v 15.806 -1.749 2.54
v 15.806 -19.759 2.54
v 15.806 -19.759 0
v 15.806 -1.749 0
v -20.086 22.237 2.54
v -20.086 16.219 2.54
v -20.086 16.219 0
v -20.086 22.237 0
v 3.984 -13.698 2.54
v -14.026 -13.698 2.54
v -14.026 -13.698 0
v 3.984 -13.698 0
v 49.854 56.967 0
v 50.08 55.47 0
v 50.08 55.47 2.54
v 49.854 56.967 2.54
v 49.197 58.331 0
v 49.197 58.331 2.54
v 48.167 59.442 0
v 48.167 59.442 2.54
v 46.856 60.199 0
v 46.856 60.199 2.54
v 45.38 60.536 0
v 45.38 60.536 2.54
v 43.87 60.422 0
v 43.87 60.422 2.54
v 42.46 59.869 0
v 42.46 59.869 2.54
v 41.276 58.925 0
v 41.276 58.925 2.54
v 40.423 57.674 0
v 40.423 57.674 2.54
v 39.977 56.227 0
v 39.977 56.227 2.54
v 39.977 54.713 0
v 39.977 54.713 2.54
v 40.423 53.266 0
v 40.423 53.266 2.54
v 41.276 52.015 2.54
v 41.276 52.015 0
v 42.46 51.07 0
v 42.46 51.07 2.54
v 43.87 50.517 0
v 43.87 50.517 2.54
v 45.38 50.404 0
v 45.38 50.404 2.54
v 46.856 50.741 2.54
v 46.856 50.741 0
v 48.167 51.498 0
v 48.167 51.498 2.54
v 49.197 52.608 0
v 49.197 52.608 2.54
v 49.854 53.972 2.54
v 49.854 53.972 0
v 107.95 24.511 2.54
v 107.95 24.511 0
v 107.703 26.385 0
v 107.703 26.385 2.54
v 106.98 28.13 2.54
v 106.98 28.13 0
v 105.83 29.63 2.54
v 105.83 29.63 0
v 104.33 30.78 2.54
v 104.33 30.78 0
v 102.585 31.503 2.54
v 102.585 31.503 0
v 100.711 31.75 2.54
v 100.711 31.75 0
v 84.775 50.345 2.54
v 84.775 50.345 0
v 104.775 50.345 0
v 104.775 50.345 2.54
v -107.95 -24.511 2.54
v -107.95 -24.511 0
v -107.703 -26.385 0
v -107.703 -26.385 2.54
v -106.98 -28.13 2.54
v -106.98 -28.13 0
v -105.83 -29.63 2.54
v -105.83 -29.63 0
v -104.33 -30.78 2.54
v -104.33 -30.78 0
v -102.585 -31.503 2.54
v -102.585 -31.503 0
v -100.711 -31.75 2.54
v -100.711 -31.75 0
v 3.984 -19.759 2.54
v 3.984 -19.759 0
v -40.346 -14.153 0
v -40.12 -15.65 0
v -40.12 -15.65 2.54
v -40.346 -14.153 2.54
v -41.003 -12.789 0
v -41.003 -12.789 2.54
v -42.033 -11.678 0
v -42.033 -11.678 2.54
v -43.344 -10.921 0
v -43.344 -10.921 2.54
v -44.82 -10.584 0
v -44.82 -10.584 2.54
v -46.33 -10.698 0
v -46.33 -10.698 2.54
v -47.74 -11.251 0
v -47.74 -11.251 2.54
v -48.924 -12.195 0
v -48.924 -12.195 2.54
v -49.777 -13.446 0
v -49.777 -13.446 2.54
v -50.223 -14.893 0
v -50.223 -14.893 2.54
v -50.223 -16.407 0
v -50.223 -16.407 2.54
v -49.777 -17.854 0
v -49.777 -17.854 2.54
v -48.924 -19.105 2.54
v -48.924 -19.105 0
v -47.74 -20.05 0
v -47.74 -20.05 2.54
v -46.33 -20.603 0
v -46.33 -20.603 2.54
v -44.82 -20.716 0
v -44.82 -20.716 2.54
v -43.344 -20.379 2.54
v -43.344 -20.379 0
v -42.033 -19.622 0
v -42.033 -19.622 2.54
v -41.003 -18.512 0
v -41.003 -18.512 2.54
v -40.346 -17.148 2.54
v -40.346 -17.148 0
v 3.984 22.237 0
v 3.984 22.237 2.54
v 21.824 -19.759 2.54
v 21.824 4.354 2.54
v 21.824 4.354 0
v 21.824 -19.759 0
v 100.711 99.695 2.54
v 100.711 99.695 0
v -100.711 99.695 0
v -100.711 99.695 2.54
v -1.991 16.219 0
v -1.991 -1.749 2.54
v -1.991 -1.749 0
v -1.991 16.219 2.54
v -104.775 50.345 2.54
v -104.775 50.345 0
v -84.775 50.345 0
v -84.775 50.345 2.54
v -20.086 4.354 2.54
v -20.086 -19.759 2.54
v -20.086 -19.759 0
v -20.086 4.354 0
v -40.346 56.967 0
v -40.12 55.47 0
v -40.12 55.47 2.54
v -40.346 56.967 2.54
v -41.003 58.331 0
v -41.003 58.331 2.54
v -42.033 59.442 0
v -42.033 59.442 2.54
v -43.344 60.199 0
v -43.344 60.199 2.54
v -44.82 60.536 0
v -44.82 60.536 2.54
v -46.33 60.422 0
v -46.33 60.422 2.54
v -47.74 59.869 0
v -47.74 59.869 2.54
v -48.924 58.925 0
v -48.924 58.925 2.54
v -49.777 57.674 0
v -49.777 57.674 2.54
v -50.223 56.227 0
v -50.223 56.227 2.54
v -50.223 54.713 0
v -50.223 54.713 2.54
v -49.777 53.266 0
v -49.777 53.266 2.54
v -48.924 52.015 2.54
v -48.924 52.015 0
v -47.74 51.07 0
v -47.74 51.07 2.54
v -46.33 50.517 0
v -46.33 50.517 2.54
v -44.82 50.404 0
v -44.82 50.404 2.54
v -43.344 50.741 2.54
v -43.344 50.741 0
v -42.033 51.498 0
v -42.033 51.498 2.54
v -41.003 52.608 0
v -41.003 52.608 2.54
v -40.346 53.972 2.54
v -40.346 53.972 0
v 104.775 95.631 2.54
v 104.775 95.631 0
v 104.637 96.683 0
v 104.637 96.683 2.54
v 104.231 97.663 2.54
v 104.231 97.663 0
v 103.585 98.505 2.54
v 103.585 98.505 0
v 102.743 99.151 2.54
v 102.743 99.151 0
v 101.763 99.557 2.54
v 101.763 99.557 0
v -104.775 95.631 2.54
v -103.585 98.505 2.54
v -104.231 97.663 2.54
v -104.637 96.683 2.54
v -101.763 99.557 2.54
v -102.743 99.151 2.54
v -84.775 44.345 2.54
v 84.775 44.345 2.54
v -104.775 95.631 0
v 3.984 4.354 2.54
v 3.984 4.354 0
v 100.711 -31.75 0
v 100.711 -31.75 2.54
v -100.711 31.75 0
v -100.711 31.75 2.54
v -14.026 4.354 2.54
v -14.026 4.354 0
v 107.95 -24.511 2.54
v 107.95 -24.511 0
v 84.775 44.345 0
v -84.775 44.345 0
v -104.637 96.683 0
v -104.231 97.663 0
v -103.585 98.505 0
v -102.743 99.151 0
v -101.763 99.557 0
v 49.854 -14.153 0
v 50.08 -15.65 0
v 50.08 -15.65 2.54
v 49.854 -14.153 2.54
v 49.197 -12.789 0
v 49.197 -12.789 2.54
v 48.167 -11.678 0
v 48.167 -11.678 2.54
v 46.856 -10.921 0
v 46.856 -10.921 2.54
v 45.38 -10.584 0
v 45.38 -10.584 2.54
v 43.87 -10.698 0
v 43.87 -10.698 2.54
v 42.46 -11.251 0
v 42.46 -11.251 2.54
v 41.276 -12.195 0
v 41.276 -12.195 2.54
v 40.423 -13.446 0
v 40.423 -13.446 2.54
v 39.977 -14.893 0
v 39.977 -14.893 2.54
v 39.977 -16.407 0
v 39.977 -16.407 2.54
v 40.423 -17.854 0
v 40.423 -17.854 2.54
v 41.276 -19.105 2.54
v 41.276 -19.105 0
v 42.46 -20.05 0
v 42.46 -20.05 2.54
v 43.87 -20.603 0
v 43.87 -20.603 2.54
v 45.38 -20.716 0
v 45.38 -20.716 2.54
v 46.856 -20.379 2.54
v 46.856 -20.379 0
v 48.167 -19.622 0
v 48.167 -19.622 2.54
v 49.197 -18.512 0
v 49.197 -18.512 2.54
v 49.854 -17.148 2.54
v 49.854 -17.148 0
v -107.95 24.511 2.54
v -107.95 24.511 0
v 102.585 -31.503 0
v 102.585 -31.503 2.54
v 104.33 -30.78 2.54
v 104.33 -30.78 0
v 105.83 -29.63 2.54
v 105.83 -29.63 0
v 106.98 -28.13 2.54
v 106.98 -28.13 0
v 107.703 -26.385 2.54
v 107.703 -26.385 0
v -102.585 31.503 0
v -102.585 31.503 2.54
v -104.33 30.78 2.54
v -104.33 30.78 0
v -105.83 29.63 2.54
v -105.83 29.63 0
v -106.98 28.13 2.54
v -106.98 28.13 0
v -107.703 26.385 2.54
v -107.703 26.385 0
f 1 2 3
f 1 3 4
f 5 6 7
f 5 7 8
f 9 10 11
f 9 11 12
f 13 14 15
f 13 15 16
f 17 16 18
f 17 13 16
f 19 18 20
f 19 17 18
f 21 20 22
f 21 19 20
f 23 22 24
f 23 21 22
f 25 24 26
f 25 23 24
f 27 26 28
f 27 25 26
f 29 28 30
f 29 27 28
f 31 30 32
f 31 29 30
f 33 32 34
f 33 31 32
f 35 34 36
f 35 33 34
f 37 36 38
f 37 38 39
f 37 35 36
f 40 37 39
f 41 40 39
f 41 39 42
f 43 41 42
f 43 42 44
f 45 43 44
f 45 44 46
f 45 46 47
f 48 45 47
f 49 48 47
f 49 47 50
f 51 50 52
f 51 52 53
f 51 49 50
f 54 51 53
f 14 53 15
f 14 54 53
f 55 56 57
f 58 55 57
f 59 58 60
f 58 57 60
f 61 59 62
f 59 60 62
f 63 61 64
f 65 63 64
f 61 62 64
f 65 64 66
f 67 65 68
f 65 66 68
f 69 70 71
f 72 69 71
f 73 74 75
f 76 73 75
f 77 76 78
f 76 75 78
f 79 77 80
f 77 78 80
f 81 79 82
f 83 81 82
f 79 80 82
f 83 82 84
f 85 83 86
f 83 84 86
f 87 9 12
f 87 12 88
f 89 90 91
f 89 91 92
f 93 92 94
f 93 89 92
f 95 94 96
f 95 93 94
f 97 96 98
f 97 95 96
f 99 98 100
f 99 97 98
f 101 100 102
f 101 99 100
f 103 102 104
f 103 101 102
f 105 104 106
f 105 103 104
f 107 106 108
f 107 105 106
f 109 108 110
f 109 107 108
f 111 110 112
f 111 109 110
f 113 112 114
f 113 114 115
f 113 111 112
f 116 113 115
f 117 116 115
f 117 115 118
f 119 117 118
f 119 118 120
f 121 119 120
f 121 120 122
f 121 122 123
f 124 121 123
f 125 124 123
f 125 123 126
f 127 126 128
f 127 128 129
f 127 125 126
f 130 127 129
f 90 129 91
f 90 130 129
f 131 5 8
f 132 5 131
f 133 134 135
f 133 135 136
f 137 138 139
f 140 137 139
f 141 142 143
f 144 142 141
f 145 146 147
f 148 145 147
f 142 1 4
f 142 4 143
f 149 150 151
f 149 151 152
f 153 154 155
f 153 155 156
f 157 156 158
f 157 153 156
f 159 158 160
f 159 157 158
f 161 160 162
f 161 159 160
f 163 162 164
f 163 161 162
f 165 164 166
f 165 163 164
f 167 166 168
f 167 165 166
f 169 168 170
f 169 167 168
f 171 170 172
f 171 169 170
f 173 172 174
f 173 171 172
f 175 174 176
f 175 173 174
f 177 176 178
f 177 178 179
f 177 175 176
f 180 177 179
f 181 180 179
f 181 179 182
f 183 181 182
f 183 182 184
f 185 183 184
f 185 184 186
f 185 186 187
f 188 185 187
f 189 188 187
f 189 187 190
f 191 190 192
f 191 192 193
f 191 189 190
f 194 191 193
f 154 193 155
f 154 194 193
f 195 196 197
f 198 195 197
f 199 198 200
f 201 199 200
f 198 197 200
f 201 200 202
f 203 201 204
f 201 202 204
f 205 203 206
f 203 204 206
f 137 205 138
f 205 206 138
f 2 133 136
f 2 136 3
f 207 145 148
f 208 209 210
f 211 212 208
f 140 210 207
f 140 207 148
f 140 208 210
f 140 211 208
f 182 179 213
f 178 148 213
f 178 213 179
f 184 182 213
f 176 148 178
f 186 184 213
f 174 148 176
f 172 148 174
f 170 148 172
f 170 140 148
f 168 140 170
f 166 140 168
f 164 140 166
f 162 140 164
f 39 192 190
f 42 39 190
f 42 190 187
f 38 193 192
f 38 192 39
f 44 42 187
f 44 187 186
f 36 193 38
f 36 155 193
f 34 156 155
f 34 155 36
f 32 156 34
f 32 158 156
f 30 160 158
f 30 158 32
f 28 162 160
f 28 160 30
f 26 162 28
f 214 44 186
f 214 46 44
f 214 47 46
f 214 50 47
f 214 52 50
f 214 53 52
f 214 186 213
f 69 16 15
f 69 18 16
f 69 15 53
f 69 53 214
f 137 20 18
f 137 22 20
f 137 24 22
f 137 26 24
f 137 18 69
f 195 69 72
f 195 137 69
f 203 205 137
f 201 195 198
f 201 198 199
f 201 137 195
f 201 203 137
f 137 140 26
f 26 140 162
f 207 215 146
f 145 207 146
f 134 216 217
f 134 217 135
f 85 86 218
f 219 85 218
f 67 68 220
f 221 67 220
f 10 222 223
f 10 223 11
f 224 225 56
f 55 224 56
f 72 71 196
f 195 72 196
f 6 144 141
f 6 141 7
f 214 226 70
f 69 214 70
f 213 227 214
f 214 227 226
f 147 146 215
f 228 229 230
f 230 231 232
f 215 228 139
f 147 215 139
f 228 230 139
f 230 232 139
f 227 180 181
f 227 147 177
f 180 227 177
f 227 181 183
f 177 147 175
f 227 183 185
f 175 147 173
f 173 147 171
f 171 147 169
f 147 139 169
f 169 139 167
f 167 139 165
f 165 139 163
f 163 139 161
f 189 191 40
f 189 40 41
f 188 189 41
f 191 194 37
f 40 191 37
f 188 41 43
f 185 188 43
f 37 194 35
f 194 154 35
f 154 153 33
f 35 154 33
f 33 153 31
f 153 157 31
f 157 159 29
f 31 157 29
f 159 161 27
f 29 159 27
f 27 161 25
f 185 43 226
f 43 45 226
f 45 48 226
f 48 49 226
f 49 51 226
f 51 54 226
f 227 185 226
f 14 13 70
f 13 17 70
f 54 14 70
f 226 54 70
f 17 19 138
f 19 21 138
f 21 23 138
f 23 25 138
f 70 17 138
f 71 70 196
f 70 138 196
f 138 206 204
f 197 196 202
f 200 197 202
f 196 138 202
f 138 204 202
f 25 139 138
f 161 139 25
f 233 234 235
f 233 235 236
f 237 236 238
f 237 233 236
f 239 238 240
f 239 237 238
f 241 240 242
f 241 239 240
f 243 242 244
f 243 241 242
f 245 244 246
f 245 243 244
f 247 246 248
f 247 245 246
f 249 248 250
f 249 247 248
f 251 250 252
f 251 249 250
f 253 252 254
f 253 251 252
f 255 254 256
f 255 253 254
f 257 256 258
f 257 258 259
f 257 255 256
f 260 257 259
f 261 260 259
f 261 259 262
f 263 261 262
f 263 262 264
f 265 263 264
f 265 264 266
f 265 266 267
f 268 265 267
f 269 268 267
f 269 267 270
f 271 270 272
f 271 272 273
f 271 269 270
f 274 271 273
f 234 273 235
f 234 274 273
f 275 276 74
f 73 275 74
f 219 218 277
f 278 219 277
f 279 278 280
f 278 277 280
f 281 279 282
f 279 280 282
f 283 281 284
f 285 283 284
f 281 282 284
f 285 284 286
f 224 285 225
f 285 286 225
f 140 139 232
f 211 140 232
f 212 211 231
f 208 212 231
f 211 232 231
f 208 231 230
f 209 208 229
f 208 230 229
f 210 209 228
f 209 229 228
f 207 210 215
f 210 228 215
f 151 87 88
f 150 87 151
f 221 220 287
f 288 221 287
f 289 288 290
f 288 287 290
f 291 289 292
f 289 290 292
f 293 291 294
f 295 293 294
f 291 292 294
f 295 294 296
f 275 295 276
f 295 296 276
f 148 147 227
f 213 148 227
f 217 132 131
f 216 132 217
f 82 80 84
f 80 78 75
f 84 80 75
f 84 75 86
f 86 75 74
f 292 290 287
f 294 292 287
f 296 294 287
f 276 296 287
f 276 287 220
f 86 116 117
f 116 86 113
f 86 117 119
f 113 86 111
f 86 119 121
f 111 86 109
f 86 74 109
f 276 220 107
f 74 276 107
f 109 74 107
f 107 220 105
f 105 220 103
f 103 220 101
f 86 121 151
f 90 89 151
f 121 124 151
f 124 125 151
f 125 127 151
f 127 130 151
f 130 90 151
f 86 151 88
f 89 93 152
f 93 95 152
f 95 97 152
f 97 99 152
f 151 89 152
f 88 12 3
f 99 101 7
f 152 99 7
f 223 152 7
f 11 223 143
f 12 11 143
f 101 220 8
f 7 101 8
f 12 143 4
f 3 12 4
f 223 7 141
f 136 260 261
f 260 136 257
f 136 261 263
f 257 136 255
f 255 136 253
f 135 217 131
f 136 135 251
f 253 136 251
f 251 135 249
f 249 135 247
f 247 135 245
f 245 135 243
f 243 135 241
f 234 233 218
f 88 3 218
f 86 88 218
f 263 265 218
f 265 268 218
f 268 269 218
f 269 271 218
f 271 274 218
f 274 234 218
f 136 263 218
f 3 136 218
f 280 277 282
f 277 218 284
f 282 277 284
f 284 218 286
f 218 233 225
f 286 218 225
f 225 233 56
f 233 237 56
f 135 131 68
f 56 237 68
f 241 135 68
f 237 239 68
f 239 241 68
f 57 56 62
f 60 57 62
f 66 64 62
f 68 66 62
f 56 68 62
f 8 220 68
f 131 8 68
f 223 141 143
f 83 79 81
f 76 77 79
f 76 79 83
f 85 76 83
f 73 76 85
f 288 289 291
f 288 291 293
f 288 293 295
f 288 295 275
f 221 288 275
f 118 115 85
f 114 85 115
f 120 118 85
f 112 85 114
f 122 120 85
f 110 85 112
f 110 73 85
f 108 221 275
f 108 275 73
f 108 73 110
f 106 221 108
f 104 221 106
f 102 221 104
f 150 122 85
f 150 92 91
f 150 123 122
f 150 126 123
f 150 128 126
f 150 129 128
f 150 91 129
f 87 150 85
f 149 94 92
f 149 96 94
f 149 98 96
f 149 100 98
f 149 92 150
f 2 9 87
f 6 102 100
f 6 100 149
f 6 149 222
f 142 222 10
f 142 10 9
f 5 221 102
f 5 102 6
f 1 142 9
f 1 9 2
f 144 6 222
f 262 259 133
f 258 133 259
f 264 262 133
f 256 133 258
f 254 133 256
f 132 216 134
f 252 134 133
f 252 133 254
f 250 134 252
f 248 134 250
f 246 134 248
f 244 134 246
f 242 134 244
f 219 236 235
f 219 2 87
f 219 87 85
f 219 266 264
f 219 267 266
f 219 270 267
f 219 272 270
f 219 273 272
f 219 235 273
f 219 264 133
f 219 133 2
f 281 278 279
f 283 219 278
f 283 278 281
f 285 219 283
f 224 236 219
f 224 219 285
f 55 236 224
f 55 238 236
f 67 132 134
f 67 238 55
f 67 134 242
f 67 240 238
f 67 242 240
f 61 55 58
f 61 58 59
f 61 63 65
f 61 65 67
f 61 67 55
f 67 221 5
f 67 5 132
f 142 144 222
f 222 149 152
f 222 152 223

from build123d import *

# Parameters (mm, degrees)
SKETCH1_R             = 5.08
BOSS_EXTRUDE1_DEPTH   = 2.54
BOSS_EXTRUDE1_2_DEPTH = 2.54
CUT_EXTRUDE1_DEPTH    = 147.965122138


with BuildPart() as part:
    # Sketch1 → Boss-Extrude1 (new body)
    with BuildSketch(Plane.XY):
        with BuildLine():
            Line((-52.6295, -31.75), (-37.7705, -31.75))
            Line((-37.7705, -31.75), (37.5705, -31.75))
            Line((37.5705, -31.75), (52.4295, -31.75))
            Line((52.4295, -31.75), (100.711, -31.75))
            ThreePointArc((100.711, -31.75), (105.829745989, -29.629745989), (107.95, -24.511))
            Line((107.95, -24.511), (107.95, 24.511))
            ThreePointArc((107.95, 24.511), (105.829745989, 29.629745989), (100.711, 31.75))
            Line((100.711, 31.75), (-100.711, 31.75))
            ThreePointArc((-100.711, 31.75), (-105.829745989, 29.629745989), (-107.95, 24.511))
            Line((-107.95, 24.511), (-107.95, -24.511))
            ThreePointArc((-107.95, -24.511), (-105.829745989, -29.629745989), (-100.711, -31.75))
            Line((-100.711, -31.75), (-52.6295, -31.75))
        make_face()
        with Locations((-45.2, -15.6502)):
            Circle(SKETCH1_R, mode=Mode.SUBTRACT)
        with Locations((45, -15.6502)):
            Circle(SKETCH1_R, mode=Mode.SUBTRACT)
    extrude(amount=BOSS_EXTRUDE1_DEPTH)

    # Sketch2 → Cut-Extrude1 (cut, through all)
    with BuildSketch(Plane.XY.offset(2.54)):
        Polygon((-20.086392144, 22.236562491), (3.984117021, 22.236562491), (3.984117021, 4.354393448), (21.823607856, 4.354393448), (21.823607856, -19.758793925), (15.805980564, -19.758793925), (15.805980564, -1.748590259), (-1.990832063, -1.748590259), (-1.990832063, 16.218935199), (-20.086392144, 16.218935199), align=None)
        Polygon((-20.086392144, 4.354393448), (-14.026086645, 4.354393448), (-14.026086645, -13.698488426), (3.984117021, -13.698488426), (3.984117021, -19.758793925), (-20.086392144, -19.758793925), align=None)
    extrude(amount=-CUT_EXTRUDE1_DEPTH, mode=Mode.SUBTRACT)


with BuildPart() as body_2:
    # Sketch1 → Boss-Extrude1 2 (new body)
    with BuildSketch(Plane.XY):
        with BuildLine():
            Line((100.711, 99.695), (-100.711, 99.695))
            ThreePointArc((-100.711, 99.695), (-103.584681959, 98.504681959), (-104.775, 95.631))
            Line((-104.775, 95.631), (-104.775, 50.345))
            Line((-104.775, 50.345), (-84.775, 50.345))
            Line((-84.775, 50.345), (-84.775, 44.345))
            Line((-84.775, 44.345), (84.775, 44.345))
            Line((84.775, 44.345), (84.775, 50.345))
            Line((84.775, 50.345), (104.775, 50.345))
            Line((104.775, 50.345), (104.775, 95.631))
            ThreePointArc((104.775, 95.631), (103.584681959, 98.504681959), (100.711, 99.695))
        make_face()
        with Locations((-45.2, 55.4698)):
            Circle(SKETCH1_R, mode=Mode.SUBTRACT)
        with Locations((45, 55.4698)):
            Circle(SKETCH1_R, mode=Mode.SUBTRACT)
    extrude(amount=BOSS_EXTRUDE1_2_DEPTH)


solid = Compound([part.part, body_2.part])
